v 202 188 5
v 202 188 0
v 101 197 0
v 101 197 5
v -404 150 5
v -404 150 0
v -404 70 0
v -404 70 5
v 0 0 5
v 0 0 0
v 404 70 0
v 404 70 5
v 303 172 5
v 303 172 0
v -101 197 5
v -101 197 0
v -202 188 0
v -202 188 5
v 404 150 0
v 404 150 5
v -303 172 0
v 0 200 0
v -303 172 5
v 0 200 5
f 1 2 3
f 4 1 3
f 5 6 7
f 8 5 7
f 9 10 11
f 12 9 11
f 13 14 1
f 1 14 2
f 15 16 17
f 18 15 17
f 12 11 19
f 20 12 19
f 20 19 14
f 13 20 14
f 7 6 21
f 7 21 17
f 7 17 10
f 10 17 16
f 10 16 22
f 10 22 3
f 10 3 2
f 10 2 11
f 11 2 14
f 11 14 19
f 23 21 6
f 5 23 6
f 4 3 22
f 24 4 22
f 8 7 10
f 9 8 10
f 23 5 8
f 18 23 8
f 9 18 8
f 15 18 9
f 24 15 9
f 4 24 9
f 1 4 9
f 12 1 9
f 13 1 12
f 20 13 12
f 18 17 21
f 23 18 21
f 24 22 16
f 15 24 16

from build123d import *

# Parameters (mm, degrees)
F1_DEPTH = 5


with BuildPart() as f1:
    # F0 (on Top) → F1 (new body)
    with BuildSketch(Plane.XY):
        Polygon((404, 70), (404, 150), (303, 172), (303, 52.5), align=None)
        Polygon((303, 52.5), (303, 172), (202, 188), (202, 35), align=None)
        Polygon((202, 35), (202, 188), (101, 197), (101, 17.5), align=None)
        Polygon((101, 17.5), (101, 197), (0, 200), (0, 0), align=None)
        Polygon((0, 0), (0, 200), (-101, 197), (-101, 17.5), align=None)
        Polygon((-101, 17.5), (-101, 197), (-202, 188), (-202, 35), align=None)
        Polygon((-202, 35), (-202, 188), (-303, 172), (-303, 52.5), align=None)
        Polygon((-303, 52.5), (-303, 172), (-404, 150), (-404, 70), align=None)
    extrude(amount=F1_DEPTH)


solid = f1.part
